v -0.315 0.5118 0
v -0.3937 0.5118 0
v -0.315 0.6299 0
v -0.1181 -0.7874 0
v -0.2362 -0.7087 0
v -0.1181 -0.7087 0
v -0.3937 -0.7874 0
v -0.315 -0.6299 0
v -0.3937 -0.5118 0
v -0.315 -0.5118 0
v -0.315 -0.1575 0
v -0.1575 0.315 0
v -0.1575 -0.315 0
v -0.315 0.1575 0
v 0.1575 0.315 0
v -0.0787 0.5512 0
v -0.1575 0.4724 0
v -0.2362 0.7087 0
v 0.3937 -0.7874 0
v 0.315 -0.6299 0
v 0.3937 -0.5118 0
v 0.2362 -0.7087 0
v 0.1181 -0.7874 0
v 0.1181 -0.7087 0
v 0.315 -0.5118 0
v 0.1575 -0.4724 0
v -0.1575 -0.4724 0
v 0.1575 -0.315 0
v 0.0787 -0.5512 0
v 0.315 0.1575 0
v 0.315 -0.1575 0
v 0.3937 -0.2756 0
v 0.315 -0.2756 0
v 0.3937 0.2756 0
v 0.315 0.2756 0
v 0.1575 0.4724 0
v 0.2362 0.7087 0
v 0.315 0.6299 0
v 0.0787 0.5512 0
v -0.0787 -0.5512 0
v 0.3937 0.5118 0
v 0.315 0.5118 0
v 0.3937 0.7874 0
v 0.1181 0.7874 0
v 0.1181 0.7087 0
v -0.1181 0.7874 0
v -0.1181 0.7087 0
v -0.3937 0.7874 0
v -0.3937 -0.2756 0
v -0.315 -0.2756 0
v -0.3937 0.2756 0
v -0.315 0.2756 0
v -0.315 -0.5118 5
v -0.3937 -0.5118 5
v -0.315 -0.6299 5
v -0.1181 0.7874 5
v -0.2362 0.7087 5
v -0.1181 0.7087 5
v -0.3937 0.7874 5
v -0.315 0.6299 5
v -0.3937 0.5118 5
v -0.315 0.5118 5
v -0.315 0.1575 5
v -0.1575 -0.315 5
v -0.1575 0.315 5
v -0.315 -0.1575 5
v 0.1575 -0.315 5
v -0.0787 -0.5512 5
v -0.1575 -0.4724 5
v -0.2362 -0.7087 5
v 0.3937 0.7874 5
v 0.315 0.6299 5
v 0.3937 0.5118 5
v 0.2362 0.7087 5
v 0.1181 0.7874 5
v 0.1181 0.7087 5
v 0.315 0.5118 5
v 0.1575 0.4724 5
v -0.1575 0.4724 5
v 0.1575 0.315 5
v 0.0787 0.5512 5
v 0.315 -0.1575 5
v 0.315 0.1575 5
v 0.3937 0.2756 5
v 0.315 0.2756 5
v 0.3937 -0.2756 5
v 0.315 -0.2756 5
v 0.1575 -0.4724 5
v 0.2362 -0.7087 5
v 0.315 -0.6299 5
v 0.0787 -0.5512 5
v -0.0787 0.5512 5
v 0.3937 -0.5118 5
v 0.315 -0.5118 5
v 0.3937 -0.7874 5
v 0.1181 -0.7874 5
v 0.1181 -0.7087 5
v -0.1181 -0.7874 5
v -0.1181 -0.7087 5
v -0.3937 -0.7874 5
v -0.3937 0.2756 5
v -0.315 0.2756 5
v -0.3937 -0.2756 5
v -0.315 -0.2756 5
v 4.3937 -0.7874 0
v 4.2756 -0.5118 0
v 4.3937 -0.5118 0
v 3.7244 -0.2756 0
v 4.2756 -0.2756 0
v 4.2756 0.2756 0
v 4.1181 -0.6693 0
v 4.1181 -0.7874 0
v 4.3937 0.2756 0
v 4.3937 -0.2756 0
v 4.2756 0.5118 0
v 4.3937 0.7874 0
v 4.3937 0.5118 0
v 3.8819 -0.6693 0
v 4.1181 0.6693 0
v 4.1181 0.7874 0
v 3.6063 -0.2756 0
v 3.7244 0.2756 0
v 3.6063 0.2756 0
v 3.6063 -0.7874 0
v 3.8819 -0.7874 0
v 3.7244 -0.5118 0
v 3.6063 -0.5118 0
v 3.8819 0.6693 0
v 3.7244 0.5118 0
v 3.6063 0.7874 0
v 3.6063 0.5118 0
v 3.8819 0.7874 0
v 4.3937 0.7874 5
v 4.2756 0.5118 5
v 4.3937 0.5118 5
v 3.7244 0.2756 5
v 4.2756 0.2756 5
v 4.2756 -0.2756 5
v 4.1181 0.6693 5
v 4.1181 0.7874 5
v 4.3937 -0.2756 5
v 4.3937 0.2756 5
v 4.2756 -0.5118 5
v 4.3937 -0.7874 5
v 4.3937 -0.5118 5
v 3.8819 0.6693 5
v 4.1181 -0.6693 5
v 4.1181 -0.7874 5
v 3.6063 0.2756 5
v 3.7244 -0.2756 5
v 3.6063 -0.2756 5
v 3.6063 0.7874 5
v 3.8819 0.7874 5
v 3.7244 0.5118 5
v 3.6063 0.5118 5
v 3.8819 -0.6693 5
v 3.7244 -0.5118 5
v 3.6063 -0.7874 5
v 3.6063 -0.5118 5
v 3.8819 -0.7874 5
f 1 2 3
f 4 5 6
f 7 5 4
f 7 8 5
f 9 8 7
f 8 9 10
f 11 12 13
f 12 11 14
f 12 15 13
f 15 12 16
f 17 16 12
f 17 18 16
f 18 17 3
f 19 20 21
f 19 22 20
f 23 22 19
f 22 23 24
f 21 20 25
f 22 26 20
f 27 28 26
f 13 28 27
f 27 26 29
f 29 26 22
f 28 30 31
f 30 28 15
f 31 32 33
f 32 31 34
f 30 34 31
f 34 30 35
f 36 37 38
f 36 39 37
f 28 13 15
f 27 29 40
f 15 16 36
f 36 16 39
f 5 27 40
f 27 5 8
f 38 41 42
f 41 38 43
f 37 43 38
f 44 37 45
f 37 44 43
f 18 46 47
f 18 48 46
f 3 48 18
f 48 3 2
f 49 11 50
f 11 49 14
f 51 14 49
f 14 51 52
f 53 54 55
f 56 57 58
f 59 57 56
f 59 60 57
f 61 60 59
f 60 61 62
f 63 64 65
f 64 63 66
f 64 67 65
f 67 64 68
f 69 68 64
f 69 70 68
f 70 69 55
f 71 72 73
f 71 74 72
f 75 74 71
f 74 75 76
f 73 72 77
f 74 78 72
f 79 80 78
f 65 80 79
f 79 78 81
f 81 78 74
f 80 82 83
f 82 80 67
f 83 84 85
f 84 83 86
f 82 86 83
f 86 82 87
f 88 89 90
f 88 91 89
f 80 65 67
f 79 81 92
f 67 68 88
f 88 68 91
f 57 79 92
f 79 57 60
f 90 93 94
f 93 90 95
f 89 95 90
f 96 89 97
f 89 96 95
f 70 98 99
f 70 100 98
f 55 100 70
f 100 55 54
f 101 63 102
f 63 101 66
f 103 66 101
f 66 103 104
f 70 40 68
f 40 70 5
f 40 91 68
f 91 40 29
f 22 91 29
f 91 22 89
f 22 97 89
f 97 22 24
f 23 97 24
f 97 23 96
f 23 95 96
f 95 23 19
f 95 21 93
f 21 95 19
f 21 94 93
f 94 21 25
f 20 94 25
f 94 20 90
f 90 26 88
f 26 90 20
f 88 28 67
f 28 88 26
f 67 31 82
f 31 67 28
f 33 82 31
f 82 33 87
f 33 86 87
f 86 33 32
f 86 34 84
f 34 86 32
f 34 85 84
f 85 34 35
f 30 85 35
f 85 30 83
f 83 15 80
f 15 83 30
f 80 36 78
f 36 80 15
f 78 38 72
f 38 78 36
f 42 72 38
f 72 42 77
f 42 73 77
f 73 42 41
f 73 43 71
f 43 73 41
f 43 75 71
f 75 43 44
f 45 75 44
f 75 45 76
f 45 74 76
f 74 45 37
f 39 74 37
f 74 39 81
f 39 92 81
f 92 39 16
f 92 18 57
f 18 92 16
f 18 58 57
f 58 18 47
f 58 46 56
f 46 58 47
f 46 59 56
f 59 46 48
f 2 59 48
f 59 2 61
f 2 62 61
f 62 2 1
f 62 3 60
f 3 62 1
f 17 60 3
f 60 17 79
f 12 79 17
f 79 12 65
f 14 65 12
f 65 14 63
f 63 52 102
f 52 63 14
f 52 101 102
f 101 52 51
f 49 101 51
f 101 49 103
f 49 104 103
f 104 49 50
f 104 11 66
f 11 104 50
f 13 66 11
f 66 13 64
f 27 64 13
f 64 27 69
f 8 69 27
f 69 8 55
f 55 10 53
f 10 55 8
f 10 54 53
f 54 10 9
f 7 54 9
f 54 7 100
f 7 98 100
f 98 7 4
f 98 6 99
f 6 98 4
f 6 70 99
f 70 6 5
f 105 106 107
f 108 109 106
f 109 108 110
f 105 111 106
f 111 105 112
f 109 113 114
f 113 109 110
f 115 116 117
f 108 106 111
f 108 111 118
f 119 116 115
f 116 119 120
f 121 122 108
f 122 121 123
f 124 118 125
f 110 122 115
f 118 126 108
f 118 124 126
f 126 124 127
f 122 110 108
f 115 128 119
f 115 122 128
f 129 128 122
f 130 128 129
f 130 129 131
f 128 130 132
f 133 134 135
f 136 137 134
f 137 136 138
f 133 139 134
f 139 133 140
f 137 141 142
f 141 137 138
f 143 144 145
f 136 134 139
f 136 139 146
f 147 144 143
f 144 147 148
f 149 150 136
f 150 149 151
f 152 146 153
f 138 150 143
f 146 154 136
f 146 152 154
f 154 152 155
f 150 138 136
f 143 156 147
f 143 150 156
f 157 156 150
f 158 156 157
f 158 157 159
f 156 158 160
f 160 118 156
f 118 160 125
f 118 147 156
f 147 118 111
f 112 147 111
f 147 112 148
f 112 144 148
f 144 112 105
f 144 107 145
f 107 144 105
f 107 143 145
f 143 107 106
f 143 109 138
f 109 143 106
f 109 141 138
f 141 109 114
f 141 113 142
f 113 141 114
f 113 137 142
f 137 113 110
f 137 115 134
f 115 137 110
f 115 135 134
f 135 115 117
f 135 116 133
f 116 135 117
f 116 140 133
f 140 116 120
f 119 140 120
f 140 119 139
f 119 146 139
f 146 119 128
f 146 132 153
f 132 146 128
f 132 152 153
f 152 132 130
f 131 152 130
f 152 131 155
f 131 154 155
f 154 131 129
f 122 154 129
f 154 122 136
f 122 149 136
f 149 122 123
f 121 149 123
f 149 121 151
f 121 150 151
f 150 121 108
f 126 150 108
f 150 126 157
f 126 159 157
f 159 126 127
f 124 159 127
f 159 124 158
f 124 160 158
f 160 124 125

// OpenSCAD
module extrusion5Series(xSegments, ySegments, zLength)
scale(1/25.4) //I hate this
linear_extrude(zLength * 25.4) //I hate this too
translate([-xSegments*10, -ySegments*10])
difference(){
	square([xSegments*20, ySegments*20]);
	
	for(i = [0:1:xSegments-1])
	translate([i*20, 0]){
		translate([7, 0])
		square([6, 2]);
		
		translate([4, 2])
		polygon([[0, 0], [4, 4], [8, 4], [12, 0]]);
		
		translate([0, ySegments*20]){
			translate([7, -2])
			square([6, 2]);
			
			translate([4, -6])
			polygon([[0, 4], [4, 0], [8, 0], [12, 4]]);
		}
	}
	
	for(i = [0:1:ySegments-1])
	translate([0, i*20]){
		translate([0, 7])
		square([2, 6]);
		
		translate([2, 4])
		polygon([[0, 0], [4, 4], [4, 8], [0, 12]]);
		
		translate([xSegments*20, 0]){
			translate([-2, 7])
			square([2, 6]);
			
			translate([-6, 4])
			polygon([[4, 0], [0, 4], [0, 8], [4, 12]]);
		}
	}
}

module extrusion5SeriesCrude(xSegments, ySegments, zLength, xyClear = 0) //This is intended to have simpler geometry to mimic the old 2020 model more and allow fitment to happen
scale(1/25.4) //More
linear_extrude(zLength * 25.4) //Even MORE!
translate([-xSegments*10 + xyClear*25.4, -ySegments*10 + xyClear*25.4])
difference(){
	square([xSegments*20 - xyClear*25.4*2, ySegments*20 - xyClear*25.4*2]);
	
	for(i = [0:1:xSegments-1])
	translate([i*20, 0]){
		translate([7 - xyClear*25.4, xyClear*25.4])
		square([6 + xyClear*25.4/2, 3 - xyClear*25.4]);
		
		translate([0, ySegments*20]){
			translate([7 - xyClear*25.4, -3 + xyClear*25.4])
			square([6 + xyClear*25.4/2, 3 - xyClear*25.4]);
		}
	}
	
	for(i = [0:1:ySegments-1])
	translate([0, i*20]){
		translate([xyClear*25.4, 7 - xyClear*25.4])
		square([3 - xyClear*25.4, 6 + xyClear*25.4/2]);
		
		translate([xSegments*20, 0]){
			translate([-3 + xyClear*25.4, 7 - xyClear*25.4])
			square([3 - xyClear*25.4, 6 + xyClear*25.4/2]);
		}
	}
}
extrusion5Series(1, 2, 5);

translate([4, 0])
extrusion5SeriesCrude(1, 2, 5);
